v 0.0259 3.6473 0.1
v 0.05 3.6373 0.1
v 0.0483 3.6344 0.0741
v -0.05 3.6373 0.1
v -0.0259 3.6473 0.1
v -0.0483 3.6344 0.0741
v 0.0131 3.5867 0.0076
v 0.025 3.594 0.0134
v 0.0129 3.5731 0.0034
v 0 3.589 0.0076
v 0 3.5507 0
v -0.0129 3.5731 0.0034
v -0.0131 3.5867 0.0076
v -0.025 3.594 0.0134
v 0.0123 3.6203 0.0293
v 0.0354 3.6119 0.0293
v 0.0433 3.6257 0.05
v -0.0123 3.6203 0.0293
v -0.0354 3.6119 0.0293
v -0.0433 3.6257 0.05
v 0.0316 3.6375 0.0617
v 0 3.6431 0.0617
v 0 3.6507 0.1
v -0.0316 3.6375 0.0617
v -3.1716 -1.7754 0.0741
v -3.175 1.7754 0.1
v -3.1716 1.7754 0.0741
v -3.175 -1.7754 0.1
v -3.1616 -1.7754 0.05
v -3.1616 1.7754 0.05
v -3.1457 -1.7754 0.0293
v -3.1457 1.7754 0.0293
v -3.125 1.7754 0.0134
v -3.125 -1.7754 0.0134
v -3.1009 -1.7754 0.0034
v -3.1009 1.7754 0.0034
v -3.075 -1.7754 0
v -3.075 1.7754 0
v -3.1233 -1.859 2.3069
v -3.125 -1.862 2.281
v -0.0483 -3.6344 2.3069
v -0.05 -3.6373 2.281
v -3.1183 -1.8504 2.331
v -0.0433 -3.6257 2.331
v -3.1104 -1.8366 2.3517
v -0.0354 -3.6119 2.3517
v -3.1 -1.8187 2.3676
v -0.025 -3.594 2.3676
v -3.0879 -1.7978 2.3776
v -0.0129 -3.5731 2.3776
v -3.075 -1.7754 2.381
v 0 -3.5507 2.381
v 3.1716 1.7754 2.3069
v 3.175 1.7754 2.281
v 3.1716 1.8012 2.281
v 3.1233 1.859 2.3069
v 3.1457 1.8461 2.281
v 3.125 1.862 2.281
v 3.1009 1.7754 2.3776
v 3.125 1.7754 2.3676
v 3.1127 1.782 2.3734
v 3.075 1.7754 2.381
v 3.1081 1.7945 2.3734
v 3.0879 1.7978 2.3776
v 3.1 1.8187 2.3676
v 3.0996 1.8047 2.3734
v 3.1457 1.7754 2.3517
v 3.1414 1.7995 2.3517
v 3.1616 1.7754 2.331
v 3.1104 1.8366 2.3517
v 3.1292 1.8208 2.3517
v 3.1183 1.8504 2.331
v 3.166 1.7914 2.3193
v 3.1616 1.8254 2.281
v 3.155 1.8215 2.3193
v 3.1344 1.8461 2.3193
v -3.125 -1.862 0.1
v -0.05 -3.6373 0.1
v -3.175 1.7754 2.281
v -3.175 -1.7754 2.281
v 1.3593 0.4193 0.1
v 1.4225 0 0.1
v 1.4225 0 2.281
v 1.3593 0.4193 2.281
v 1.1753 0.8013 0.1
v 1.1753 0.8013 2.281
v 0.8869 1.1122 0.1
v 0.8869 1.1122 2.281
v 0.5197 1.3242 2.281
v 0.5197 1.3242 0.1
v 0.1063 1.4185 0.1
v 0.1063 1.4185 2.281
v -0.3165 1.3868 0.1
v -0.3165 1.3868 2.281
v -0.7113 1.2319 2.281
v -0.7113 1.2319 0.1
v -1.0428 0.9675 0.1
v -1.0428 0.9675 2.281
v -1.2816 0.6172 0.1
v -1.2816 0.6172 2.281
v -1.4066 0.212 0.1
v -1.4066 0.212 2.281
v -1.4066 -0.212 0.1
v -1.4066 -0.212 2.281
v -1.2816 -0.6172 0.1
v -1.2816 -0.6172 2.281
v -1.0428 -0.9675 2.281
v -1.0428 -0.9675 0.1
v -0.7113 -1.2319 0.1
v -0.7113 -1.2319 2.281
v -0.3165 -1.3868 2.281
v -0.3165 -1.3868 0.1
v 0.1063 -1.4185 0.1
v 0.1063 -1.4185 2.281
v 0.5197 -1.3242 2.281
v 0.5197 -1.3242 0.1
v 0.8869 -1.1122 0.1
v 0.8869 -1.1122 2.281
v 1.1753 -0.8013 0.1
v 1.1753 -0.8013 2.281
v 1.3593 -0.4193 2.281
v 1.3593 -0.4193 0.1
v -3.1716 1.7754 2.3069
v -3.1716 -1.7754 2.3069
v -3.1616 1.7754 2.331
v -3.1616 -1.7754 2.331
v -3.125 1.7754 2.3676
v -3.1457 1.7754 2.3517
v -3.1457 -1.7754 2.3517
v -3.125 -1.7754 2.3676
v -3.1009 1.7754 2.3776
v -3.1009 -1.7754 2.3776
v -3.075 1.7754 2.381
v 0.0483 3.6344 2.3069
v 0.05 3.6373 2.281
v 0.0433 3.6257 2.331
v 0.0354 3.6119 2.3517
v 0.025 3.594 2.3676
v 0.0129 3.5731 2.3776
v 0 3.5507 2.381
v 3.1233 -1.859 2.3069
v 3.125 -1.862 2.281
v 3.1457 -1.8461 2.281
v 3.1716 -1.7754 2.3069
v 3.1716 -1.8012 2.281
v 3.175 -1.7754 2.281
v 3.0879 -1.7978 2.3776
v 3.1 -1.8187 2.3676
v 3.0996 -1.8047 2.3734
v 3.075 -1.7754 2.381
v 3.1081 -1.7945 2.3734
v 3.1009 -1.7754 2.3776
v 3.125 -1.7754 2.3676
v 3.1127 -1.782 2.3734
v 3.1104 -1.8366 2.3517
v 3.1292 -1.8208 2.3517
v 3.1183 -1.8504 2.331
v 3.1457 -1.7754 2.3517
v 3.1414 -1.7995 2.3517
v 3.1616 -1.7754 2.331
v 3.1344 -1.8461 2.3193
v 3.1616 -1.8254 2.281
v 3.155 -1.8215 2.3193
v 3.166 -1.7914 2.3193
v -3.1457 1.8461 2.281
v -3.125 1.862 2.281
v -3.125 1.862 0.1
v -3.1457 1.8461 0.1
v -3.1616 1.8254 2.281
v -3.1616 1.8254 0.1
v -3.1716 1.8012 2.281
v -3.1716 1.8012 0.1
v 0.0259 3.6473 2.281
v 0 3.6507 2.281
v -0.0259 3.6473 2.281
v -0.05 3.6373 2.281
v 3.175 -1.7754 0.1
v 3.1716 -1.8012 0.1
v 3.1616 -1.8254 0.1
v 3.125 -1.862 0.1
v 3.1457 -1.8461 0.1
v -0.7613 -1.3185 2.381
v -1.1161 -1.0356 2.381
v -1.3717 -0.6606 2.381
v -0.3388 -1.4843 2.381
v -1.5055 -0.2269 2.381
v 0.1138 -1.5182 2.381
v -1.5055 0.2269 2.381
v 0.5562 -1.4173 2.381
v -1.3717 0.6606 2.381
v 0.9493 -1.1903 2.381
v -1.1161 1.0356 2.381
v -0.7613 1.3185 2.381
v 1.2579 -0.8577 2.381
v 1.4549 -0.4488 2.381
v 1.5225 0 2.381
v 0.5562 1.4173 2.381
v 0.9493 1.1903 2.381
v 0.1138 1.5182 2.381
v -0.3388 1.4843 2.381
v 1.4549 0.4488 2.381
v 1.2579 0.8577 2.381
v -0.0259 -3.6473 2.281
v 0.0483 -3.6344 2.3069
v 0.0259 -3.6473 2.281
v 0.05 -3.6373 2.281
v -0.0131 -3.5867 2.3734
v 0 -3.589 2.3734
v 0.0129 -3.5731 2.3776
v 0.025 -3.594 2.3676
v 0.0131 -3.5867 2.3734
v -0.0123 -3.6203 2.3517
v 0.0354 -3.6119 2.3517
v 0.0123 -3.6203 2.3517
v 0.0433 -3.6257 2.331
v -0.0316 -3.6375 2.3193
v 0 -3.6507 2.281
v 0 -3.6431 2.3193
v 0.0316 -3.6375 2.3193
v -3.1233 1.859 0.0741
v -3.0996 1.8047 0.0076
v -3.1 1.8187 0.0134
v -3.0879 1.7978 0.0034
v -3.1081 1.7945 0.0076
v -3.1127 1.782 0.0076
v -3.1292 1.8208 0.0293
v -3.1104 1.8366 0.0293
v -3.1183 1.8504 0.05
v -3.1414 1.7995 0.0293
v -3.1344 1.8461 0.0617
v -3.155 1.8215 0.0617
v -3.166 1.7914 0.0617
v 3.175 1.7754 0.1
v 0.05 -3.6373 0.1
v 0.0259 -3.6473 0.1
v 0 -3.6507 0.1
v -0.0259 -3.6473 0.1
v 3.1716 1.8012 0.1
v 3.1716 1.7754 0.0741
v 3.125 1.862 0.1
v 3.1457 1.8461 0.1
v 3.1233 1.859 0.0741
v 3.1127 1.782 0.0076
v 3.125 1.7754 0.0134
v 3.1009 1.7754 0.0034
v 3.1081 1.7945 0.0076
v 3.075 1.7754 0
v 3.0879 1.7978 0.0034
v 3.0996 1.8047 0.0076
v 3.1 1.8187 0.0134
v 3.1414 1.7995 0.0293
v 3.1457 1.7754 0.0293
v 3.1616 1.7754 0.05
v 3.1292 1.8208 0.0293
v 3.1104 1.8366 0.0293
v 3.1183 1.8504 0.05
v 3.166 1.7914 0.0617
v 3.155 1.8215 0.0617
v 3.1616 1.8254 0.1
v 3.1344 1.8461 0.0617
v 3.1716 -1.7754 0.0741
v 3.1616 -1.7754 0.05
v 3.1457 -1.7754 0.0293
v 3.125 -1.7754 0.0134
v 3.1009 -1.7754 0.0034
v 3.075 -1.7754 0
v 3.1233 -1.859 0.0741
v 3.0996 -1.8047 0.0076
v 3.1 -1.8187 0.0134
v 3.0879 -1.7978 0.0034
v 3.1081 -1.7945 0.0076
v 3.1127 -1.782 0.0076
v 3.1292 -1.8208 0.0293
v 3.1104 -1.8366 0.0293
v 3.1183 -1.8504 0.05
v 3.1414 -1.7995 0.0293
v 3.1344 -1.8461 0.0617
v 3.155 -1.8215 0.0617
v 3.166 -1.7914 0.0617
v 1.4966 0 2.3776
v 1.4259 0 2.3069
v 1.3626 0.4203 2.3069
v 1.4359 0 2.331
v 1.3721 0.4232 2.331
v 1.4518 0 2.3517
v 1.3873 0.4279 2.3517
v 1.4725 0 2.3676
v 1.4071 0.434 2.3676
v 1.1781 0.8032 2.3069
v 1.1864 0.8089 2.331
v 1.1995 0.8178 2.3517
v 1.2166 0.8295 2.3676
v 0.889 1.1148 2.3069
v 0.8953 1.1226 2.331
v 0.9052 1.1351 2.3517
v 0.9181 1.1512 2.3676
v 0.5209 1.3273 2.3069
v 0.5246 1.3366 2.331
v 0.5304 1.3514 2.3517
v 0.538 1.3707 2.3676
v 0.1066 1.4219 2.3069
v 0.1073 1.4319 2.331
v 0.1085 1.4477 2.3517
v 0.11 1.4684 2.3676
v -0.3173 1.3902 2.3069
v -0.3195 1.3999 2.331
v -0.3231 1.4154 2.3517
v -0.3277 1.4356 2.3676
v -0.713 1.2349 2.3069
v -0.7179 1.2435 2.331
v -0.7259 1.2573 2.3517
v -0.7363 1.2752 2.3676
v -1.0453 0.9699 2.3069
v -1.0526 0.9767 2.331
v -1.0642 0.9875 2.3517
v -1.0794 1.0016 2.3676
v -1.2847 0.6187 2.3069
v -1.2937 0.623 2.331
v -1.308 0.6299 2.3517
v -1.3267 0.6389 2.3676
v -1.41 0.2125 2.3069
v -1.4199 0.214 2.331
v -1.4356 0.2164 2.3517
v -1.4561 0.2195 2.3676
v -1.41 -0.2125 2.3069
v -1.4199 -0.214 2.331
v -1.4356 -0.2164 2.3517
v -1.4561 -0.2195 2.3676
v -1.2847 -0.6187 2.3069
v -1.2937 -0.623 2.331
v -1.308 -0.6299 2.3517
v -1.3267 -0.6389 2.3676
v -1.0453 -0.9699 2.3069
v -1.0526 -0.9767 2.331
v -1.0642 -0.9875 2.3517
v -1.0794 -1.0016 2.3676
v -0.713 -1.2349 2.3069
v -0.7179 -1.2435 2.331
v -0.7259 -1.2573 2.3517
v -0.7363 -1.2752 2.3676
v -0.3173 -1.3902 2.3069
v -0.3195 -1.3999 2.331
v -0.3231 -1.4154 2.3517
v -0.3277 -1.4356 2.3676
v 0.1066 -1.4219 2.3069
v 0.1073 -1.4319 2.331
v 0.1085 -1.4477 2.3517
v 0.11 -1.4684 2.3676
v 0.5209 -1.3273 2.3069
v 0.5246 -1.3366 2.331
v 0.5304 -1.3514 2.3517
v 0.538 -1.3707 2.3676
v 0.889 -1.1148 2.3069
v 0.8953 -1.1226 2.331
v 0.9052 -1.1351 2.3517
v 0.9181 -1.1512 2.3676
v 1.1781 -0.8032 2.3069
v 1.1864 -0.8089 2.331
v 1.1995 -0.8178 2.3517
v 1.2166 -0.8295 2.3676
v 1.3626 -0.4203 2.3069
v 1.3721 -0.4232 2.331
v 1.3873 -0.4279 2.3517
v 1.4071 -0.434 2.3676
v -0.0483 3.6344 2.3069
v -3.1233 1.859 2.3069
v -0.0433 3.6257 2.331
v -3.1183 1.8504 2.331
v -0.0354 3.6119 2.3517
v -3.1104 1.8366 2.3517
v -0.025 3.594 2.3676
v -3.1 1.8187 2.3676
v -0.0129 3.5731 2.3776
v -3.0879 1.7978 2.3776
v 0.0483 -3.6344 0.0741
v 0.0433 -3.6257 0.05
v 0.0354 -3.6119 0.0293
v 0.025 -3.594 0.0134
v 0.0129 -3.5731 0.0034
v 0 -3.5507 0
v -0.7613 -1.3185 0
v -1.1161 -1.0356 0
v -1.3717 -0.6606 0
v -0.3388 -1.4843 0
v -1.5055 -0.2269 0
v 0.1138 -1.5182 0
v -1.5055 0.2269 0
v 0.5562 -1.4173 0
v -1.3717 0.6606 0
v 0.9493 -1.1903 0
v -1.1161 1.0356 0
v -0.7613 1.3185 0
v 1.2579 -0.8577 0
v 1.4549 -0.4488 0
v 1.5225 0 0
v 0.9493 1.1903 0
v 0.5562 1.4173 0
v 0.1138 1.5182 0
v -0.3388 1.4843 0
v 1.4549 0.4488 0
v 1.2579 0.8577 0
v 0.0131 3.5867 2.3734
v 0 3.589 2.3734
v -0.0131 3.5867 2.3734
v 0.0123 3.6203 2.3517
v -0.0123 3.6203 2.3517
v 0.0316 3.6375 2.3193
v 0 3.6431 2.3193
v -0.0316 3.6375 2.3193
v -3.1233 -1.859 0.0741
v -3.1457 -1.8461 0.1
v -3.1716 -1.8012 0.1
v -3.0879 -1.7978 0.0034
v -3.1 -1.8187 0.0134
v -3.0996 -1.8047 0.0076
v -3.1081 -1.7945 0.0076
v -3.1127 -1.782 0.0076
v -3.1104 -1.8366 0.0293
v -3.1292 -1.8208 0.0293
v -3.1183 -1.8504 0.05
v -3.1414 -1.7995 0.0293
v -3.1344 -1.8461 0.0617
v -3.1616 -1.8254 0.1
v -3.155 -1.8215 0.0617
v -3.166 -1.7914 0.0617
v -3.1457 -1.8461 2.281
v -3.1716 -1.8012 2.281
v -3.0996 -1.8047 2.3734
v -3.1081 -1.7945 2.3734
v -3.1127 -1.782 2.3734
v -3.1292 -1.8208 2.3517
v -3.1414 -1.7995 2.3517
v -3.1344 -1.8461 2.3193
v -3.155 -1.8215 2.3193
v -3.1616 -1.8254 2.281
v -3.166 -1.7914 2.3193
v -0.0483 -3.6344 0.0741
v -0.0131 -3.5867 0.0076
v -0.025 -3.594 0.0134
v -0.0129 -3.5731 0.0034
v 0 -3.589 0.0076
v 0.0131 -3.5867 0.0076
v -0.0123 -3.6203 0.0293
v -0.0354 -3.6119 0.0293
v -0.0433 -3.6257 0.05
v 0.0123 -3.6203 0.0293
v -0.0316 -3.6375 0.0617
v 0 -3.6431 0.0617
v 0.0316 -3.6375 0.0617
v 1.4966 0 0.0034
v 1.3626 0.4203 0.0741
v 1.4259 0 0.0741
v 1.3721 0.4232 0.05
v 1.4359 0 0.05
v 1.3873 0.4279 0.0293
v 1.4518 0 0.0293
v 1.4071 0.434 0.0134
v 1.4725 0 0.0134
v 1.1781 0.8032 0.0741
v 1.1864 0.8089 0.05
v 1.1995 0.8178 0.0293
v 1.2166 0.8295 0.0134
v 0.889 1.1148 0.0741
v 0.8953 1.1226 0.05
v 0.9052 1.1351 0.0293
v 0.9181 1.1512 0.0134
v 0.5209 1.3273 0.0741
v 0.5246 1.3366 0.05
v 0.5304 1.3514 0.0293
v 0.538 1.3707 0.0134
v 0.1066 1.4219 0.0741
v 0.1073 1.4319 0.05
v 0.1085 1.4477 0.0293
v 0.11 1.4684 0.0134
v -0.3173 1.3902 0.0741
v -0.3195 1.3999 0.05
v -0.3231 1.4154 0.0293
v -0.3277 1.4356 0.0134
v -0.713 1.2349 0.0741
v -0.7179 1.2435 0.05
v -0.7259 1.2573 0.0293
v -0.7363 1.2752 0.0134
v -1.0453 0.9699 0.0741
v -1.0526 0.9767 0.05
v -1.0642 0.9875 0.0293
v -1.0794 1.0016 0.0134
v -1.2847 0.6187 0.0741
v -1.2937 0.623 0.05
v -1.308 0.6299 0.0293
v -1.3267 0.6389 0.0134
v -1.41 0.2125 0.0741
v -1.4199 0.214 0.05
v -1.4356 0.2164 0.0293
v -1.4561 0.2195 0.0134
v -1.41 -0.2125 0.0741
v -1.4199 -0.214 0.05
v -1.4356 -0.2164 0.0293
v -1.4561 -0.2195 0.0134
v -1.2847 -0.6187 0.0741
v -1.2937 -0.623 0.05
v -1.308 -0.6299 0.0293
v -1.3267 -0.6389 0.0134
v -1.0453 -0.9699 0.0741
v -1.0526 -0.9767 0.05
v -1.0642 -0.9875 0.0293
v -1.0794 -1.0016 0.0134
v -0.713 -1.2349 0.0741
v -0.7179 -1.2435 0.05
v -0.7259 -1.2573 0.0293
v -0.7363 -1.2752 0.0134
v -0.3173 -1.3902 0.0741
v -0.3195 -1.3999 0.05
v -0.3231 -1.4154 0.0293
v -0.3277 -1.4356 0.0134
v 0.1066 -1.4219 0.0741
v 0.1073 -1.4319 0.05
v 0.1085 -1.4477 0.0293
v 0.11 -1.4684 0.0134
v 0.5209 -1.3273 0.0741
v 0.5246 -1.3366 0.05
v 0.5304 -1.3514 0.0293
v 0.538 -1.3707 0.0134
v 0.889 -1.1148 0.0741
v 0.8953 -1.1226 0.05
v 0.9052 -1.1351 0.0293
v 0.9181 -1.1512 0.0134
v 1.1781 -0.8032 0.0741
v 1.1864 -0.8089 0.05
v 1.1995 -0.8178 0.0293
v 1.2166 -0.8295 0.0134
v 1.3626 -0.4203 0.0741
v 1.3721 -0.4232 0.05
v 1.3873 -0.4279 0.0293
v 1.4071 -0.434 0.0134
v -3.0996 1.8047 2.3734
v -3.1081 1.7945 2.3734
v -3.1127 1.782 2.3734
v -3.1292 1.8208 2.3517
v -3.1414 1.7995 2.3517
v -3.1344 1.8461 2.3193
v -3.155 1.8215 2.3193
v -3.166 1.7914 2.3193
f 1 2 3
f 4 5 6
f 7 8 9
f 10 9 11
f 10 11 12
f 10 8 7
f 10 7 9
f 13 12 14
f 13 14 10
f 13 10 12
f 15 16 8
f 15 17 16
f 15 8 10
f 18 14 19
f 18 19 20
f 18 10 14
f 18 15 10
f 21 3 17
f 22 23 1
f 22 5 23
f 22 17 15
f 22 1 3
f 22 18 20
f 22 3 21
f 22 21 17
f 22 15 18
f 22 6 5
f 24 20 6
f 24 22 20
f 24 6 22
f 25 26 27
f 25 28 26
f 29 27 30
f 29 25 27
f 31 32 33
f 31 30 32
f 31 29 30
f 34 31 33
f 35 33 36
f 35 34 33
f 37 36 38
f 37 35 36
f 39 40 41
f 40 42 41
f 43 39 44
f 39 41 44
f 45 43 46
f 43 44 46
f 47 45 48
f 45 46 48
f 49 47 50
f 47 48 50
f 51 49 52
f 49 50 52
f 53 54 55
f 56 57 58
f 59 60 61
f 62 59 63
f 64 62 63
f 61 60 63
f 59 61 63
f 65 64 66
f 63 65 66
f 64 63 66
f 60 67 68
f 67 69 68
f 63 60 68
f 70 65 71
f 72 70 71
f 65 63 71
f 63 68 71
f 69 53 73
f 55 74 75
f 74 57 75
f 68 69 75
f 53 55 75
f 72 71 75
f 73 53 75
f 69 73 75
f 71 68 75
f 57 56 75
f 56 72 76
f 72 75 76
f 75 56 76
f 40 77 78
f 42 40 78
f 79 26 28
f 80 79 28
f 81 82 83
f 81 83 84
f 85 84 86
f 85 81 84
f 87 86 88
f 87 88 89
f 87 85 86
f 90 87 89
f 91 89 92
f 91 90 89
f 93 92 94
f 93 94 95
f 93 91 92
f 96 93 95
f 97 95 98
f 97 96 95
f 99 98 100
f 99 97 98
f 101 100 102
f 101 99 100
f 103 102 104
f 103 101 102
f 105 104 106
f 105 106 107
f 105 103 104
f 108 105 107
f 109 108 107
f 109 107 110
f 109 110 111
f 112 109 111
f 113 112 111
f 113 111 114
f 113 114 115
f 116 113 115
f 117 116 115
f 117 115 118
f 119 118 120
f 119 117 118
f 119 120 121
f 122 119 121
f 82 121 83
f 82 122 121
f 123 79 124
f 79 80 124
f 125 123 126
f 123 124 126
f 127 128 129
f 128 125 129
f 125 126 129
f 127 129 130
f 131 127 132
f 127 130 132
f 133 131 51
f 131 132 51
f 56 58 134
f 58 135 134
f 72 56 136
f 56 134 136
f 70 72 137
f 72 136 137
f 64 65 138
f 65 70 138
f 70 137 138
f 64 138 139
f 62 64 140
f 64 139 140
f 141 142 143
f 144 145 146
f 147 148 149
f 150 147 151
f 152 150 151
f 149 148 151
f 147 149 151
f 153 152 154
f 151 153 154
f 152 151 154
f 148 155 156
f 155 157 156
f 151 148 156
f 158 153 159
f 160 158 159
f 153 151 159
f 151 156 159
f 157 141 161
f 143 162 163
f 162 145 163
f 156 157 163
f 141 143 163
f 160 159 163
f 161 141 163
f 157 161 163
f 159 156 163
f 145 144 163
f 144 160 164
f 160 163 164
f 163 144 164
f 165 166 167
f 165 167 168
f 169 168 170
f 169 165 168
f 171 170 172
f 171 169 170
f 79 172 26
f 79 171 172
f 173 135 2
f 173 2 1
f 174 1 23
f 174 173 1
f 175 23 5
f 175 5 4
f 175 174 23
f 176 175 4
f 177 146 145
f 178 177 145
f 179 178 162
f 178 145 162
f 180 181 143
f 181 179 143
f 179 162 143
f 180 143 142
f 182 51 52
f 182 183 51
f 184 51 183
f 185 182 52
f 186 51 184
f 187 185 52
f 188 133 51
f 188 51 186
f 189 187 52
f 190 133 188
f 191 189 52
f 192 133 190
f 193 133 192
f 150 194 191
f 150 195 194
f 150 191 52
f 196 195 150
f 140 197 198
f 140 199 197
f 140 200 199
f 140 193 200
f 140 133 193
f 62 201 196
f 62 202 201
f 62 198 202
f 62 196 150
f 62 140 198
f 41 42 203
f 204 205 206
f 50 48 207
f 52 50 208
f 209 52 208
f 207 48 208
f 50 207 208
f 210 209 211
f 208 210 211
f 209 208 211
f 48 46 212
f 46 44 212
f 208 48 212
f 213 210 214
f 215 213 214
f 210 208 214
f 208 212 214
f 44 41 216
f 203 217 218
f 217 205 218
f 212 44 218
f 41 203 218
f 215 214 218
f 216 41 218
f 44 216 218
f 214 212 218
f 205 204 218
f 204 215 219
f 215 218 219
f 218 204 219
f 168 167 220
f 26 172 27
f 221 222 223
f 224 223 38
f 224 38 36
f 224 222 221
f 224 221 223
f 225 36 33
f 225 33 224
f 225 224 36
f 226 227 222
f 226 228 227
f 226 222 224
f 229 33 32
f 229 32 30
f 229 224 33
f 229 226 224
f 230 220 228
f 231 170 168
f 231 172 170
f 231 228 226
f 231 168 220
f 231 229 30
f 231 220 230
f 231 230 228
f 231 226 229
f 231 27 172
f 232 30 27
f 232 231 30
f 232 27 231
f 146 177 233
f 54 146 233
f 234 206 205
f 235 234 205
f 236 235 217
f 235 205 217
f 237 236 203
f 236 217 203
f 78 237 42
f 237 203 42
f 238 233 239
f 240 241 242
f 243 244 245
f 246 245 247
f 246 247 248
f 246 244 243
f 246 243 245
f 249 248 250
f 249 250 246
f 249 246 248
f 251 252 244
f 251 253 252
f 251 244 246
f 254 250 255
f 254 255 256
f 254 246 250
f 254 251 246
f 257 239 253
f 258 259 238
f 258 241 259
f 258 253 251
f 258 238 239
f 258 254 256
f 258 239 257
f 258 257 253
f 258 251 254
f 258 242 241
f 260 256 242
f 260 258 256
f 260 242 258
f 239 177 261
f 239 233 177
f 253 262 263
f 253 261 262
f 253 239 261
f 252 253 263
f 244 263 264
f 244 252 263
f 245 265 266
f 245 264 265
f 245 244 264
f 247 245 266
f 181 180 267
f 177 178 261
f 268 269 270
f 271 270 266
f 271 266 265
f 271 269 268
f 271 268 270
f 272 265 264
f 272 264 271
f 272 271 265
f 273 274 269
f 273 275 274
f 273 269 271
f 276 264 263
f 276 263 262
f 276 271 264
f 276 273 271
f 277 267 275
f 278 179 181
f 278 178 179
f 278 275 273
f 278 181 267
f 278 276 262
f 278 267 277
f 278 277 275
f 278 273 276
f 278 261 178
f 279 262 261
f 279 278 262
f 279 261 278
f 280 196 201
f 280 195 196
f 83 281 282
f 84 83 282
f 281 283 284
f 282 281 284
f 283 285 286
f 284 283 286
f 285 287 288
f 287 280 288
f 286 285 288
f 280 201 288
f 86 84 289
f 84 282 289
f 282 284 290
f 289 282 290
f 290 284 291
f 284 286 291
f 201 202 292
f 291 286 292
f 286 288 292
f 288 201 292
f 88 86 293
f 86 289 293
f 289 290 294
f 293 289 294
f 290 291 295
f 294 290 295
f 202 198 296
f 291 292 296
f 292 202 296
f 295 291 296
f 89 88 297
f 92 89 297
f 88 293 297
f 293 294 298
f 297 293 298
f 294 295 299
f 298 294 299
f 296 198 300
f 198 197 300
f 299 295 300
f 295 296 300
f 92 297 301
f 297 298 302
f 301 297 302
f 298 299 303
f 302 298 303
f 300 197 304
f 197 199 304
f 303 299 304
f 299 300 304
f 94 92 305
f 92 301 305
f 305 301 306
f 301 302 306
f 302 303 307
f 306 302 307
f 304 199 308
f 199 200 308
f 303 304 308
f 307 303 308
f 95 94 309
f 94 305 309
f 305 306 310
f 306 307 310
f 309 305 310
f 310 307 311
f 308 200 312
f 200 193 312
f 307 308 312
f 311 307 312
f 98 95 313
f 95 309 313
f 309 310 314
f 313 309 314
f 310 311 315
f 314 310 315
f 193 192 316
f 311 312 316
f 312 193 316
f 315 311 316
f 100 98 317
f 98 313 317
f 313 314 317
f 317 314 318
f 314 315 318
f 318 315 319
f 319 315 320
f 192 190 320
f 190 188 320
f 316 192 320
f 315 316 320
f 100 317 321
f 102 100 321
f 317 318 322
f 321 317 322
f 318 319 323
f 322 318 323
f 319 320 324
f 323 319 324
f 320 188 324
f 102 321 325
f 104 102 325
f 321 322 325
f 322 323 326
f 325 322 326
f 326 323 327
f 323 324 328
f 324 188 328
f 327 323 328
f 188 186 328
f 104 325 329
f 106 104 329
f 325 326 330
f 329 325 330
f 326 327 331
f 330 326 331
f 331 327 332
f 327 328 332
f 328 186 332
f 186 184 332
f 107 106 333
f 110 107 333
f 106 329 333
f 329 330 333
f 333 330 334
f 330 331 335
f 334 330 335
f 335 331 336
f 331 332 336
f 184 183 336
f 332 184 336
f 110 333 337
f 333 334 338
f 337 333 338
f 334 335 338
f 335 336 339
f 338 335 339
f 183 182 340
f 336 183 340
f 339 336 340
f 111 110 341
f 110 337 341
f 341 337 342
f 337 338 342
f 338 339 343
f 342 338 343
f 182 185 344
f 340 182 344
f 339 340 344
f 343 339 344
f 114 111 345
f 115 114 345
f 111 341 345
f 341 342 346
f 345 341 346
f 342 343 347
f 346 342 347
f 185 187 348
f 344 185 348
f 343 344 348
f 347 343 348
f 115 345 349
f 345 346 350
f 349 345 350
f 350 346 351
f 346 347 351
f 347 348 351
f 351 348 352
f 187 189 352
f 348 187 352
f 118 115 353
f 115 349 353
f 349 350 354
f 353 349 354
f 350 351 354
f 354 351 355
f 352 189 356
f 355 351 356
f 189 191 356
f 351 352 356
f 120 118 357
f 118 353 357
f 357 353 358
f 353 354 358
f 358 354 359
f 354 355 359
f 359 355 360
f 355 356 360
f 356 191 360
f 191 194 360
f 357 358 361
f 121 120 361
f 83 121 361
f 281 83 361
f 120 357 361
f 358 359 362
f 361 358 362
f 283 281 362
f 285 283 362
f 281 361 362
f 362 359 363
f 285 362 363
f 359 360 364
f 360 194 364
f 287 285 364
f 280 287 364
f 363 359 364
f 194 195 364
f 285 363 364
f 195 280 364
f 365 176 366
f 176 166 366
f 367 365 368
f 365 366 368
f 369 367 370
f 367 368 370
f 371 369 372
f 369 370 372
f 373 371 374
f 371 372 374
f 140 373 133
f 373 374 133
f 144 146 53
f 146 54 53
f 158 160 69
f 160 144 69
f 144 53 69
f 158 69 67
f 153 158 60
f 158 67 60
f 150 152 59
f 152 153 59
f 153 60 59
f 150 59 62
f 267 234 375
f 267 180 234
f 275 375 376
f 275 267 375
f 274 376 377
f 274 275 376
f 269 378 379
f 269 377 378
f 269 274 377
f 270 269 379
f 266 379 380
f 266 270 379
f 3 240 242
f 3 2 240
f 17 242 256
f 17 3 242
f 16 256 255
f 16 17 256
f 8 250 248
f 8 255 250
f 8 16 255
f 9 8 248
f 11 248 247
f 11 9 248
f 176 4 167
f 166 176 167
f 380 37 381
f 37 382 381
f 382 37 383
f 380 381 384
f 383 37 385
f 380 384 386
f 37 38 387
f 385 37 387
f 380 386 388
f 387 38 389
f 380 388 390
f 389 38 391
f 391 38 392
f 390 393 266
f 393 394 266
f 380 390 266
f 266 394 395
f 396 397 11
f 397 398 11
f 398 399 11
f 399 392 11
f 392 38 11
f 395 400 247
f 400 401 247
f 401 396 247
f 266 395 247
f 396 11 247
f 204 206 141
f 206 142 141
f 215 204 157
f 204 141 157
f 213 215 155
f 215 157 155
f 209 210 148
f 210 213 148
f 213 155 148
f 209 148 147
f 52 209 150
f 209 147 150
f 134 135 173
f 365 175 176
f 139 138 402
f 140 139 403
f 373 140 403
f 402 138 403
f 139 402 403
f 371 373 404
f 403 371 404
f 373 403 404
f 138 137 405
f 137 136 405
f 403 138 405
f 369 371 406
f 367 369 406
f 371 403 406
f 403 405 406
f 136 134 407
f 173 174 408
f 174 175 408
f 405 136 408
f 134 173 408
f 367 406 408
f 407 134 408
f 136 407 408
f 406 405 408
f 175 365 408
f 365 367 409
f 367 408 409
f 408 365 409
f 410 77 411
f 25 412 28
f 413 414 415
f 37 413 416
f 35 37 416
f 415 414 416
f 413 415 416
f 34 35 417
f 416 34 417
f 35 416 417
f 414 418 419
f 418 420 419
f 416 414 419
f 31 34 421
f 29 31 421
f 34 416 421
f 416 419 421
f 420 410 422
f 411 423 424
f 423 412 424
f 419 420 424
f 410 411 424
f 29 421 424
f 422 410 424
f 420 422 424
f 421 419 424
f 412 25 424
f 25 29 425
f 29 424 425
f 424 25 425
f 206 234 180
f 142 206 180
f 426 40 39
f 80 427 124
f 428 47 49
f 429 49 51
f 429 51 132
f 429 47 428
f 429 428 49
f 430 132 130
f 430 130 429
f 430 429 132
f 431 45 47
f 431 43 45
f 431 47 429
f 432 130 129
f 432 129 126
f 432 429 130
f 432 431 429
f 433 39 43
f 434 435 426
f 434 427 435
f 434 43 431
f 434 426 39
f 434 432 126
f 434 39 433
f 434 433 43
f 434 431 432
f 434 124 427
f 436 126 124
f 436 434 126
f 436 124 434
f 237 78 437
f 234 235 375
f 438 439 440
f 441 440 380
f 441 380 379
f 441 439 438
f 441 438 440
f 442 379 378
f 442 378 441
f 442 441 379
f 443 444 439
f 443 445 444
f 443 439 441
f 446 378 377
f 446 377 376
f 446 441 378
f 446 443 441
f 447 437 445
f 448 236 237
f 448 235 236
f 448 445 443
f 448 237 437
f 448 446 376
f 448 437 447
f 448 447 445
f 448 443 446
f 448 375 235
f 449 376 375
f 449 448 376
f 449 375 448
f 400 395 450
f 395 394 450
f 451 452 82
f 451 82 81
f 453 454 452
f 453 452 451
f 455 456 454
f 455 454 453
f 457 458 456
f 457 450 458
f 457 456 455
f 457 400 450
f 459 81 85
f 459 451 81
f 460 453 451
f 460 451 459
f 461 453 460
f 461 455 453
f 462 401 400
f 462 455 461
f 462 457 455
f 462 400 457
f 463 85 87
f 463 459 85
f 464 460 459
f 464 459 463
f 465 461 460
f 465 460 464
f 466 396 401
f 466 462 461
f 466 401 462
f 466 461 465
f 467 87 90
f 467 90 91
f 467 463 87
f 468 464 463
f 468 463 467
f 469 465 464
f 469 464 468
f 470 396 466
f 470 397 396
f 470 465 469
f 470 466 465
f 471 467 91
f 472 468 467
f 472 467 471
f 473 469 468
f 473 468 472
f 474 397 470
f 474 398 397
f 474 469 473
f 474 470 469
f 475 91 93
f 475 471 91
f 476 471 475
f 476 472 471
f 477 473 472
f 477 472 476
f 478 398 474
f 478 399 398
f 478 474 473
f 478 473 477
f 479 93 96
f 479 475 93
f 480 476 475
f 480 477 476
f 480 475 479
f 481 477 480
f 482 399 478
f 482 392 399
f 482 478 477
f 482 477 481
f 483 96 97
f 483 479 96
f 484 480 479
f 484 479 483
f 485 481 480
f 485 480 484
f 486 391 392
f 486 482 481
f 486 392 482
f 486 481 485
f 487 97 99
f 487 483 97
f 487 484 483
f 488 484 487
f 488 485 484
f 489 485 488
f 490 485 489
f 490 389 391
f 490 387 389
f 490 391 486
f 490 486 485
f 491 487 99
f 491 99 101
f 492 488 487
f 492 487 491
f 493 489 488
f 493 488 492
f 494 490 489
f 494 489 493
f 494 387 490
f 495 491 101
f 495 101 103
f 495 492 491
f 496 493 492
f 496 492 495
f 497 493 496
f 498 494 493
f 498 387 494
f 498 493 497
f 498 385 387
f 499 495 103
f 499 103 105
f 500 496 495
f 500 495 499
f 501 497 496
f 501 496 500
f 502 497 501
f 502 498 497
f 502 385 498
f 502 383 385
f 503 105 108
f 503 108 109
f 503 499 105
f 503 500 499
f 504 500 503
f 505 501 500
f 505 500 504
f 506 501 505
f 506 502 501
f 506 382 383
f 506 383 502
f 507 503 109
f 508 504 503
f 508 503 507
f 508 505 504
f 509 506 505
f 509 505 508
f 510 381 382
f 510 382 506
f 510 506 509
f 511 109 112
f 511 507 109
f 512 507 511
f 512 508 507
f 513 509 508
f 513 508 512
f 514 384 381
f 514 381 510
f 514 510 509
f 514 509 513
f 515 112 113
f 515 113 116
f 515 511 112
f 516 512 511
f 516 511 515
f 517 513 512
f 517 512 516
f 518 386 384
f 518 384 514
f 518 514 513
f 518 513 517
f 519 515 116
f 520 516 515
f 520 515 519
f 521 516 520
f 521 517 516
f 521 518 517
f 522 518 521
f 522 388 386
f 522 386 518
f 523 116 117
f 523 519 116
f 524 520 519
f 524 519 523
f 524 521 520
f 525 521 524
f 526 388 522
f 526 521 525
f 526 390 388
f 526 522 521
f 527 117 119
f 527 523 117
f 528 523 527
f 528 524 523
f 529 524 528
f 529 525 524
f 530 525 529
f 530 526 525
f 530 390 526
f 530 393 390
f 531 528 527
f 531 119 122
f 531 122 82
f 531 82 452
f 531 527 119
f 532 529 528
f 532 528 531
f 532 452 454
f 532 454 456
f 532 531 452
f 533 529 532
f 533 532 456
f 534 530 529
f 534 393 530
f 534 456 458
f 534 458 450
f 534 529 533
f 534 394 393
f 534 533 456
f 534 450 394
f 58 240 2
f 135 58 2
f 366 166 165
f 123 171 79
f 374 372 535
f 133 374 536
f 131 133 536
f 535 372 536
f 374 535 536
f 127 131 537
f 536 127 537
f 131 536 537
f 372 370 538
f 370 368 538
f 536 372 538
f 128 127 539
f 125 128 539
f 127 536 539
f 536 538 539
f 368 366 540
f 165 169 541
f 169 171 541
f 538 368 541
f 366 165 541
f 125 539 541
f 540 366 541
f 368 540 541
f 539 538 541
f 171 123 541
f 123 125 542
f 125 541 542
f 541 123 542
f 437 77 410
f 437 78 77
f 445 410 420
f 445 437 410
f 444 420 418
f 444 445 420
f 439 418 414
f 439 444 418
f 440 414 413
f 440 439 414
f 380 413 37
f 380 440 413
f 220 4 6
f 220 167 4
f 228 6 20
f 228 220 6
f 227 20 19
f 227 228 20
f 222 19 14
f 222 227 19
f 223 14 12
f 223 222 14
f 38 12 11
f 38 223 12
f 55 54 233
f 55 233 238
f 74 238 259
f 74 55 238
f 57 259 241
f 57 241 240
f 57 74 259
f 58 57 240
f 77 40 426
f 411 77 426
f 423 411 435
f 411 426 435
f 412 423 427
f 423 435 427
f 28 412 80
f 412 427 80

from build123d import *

# Parameters (mm, degrees)
F0_R     = 1.4225
F1_DEPTH = 2.381
F2_R     = 0.1


with BuildPart() as f1:
    # F0 (on Top) → F1 (new body)
    with BuildSketch(Plane.XY):
        Polygon((3.175, -1.833087), (3.175, 1.833087), (0, 3.666174), (-3.175, 1.833087), (-3.175, -1.833087), (0, -3.666174), align=None)
        Circle(F0_R, mode=Mode.SUBTRACT)
    extrude(amount=F1_DEPTH)

    # F2
    f2_edges = [f1.edges().sort_by_distance(p)[0] for p in [
        (-3.175, -1.833087, 1.1905),
        (0, -3.666174, 1.1905),
        (-1.5875, -2.749631, 0),
        (-1.5875, -2.749631, 2.381),
        (3.175, -1.833087, 1.1905),
        (1.5875, -2.749631, 0),
        (1.5875, -2.749631, 2.381),
        (3.175, 1.833087, 1.1905),
        (3.175, 0, 0),
        (3.175, 0, 2.381),
        (0, 3.666174, 1.1905),
        (1.5875, 2.749631, 0),
        (1.5875, 2.749631, 2.381),
        (-3.175, 1.833087, 1.1905),
        (-1.5875, 2.749631, 0),
        (-1.5875, 2.749631, 2.381),
        (-3.175, 0, 0),
        (-3.175, 0, 2.381),
        (1.4225, 0, 1.1905),
        (-1.4225, 0, 0),
        (-1.4225, 0, 2.381),
    ]]
    fillet(f2_edges, radius=F2_R)


solid = f1.part
